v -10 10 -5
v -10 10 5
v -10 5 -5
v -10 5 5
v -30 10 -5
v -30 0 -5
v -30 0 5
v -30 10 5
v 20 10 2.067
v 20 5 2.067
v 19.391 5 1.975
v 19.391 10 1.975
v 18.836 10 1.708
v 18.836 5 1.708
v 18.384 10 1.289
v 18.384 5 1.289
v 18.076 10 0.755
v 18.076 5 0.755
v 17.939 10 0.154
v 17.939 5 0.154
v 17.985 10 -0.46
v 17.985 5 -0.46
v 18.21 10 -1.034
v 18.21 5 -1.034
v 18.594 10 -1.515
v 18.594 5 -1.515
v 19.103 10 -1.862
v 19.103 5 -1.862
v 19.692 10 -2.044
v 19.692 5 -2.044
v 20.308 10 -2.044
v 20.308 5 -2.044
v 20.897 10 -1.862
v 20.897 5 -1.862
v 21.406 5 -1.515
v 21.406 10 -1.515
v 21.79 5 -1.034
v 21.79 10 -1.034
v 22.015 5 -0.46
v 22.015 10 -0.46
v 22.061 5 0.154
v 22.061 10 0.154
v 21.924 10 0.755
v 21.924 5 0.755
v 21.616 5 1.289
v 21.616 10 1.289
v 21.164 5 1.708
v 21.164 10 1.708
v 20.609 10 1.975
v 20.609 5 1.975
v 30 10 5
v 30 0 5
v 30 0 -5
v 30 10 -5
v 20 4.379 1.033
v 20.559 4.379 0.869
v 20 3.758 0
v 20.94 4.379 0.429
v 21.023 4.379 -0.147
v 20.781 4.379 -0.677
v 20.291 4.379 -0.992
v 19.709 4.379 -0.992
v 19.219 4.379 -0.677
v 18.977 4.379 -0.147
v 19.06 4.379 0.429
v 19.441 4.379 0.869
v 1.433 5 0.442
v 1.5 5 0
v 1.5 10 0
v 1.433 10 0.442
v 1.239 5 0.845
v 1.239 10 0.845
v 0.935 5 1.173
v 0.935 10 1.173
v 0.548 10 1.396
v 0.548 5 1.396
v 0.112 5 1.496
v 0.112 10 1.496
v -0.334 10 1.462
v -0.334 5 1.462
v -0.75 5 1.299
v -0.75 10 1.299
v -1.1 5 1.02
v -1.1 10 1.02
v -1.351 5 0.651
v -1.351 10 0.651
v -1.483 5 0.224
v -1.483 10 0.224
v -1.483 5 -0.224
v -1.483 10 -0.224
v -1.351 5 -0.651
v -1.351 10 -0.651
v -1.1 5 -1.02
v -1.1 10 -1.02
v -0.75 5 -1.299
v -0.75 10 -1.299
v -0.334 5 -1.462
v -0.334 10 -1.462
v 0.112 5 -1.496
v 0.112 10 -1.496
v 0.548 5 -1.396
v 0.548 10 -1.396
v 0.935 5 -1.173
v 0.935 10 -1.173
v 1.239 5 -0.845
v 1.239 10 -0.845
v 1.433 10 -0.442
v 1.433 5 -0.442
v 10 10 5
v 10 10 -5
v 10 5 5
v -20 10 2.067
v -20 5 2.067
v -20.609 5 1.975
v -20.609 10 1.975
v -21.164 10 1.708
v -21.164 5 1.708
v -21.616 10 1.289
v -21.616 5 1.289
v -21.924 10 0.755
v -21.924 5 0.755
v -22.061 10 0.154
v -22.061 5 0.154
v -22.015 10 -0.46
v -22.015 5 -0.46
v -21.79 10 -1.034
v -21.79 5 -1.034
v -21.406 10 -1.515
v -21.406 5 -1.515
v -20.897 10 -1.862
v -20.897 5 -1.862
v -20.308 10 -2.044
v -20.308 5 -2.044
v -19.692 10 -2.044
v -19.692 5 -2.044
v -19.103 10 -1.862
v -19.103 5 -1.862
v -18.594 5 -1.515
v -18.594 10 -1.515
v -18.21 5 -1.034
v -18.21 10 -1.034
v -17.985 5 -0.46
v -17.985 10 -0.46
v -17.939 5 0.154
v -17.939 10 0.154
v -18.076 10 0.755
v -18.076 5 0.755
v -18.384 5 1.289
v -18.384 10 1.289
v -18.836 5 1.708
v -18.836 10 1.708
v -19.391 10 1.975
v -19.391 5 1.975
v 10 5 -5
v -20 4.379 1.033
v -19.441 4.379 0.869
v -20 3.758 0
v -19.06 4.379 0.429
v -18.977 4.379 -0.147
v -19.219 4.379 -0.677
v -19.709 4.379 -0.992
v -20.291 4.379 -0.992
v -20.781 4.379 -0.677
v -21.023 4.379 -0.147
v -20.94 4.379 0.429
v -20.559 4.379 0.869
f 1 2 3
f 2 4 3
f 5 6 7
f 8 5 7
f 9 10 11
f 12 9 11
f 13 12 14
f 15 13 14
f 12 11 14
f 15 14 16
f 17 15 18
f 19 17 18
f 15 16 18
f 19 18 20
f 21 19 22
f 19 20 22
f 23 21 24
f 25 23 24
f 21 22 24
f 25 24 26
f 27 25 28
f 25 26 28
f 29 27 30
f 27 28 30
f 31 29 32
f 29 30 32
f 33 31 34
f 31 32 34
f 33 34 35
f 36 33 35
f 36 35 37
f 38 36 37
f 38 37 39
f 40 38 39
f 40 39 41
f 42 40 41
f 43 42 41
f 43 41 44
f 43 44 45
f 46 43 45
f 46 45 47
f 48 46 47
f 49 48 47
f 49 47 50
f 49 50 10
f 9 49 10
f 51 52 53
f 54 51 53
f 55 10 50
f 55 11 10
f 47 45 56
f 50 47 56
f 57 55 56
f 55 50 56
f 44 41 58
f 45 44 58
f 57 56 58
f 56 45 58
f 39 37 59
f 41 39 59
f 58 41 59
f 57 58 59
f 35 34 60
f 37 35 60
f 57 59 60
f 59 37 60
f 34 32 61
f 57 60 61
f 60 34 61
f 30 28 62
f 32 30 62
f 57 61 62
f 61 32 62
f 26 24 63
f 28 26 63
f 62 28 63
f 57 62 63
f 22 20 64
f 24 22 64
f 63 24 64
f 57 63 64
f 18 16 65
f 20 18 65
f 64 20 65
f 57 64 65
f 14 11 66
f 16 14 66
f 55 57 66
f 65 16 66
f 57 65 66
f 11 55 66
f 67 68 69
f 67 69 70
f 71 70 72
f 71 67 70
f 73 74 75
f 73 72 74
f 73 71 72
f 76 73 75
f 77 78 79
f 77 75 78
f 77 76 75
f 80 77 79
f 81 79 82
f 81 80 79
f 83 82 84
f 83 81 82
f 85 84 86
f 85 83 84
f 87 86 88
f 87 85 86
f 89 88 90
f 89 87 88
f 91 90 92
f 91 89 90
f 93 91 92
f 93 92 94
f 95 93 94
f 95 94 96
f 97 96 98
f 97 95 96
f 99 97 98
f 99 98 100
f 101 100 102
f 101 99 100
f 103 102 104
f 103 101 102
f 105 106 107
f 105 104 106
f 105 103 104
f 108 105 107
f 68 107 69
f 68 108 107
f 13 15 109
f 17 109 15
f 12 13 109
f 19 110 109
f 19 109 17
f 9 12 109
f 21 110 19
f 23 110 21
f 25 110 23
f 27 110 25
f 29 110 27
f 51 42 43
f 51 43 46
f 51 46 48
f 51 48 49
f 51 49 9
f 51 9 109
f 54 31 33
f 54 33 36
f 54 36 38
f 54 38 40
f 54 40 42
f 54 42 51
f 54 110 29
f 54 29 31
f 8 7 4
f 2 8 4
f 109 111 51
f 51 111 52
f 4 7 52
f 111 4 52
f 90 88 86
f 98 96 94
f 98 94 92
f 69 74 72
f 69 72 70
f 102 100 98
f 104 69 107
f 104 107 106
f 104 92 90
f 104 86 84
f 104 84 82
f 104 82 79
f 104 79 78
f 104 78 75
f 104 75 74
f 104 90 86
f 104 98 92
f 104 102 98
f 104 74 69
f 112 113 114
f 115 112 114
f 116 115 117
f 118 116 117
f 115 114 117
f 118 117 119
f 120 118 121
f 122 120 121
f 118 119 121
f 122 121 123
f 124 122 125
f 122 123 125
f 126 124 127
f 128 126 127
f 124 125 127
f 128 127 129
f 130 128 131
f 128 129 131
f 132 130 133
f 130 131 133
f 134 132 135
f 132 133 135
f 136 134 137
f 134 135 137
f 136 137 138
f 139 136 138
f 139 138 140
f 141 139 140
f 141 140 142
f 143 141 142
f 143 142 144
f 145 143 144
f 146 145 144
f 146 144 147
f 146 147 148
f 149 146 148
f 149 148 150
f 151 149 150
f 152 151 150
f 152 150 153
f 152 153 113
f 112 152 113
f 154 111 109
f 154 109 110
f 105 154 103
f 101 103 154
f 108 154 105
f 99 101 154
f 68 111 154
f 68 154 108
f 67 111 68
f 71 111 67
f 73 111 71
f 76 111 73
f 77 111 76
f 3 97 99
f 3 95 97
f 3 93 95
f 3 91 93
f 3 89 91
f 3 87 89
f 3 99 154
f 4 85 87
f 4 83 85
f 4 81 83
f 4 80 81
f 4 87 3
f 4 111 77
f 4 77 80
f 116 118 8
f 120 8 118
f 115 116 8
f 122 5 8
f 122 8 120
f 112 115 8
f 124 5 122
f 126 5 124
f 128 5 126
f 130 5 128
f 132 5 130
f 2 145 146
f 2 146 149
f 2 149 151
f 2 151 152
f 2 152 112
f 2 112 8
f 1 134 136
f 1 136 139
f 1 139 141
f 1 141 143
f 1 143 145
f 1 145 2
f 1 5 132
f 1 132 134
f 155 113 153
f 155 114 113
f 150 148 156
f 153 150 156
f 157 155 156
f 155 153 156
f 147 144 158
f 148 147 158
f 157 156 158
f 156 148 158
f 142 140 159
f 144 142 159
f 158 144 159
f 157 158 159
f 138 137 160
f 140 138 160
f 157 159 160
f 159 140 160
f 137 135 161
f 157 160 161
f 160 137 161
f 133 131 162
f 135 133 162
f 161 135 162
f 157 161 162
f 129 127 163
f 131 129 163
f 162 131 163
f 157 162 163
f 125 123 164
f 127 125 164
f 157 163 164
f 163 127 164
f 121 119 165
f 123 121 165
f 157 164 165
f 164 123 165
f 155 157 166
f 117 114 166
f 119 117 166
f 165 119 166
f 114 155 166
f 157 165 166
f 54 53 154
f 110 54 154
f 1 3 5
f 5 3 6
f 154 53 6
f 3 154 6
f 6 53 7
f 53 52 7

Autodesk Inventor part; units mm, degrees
ref_plane "YZ Plane" through (0, 0, 0) normal (1, 0, 0) x (0, 1, 0)
ref_plane "XZ Plane" through (0, 0, 0) normal (0, 1, 0) x (-1, 0, 0)
ref_plane "XY Plane" through (0, 0, 0) normal (0, 0, 1) x (1, 0, 0)
sketch "Szkic1" plane through (0, 0, 0) normal (0, 0, 1) x (1, 0, 0)
  point P0 (0, 0)
sketch "Szkic2" plane through (0, 0, 0) normal (0, 1, 0) x (-1, 0, 0)
  line L0 (30, 5) -> (-30, 5)
  line L1 (-30, 5) -> (-30, -5)
  line L2 (-30, -5) -> (30, -5)
  line L3 (30, -5) -> (30, 5)
  line L4 (13.3205, 0) -> (-15.9073, 0) construction
  line L5 (0, 22.8583) -> (0, -40.0607) construction
  point P0 (0, 0)
  dimension "d0" = 10
  dimension "d1" = 60
extrude "Wyciągnięcie proste1" add sketch "Szkic2" along normal blind 5
sketch "Szkic3" plane through (0, 5, 0) normal (0, 1, 0) x (1, 0, 0)
  line L0 (-30, 5) -> (-30, -5) projected
  line L1 (30, 5) -> (-30, 5) projected
  line L2 (-30, -5) -> (-10, -5)
  line L3 (-10, -5) -> (-10, 5)
  line L4 (-10, 5) -> (-30, 5)
  line L5 (-30, 5) -> (-30, -5)
  line L6 (30, -5) -> (10, -5)
  line L7 (10, -5) -> (10, 5)
  line L8 (10, 5) -> (30, 5)
  line L9 (30, 5) -> (30, -5)
  line L10 (0, 41.547) -> (0, -40.407) construction
  circle A0 centre (0, 0) radius 1.5
  dimension "d4" = 20
  dimension "d5" = 20
  dimension "d6" = 3
extrude "Wyciągnięcie proste2" add sketch "Szkic3" along normal blind 5
sketch "Szkic4" plane through (0, 10, 0) normal (0, 1, 0) x (1, 0, 0)
  line L0 (0, 14.0263) -> (0, -15.9036) construction
  line L1 (-30, 5) -> (-30, -5) projected
  point P0 (0, 0)
  point P1 (-20, 0)
  point P2 (20, 0)
  dimension "d9" = 10
hole "Otwór1" at (-20, 10, 0) at (20, 10, 0) direction (0, -1, 0) diameter 4.134 depth 5 tip angle 118 thread size "M5x0.8" class "6H" standard "ISO Metric profile"
properties part number "środek"
